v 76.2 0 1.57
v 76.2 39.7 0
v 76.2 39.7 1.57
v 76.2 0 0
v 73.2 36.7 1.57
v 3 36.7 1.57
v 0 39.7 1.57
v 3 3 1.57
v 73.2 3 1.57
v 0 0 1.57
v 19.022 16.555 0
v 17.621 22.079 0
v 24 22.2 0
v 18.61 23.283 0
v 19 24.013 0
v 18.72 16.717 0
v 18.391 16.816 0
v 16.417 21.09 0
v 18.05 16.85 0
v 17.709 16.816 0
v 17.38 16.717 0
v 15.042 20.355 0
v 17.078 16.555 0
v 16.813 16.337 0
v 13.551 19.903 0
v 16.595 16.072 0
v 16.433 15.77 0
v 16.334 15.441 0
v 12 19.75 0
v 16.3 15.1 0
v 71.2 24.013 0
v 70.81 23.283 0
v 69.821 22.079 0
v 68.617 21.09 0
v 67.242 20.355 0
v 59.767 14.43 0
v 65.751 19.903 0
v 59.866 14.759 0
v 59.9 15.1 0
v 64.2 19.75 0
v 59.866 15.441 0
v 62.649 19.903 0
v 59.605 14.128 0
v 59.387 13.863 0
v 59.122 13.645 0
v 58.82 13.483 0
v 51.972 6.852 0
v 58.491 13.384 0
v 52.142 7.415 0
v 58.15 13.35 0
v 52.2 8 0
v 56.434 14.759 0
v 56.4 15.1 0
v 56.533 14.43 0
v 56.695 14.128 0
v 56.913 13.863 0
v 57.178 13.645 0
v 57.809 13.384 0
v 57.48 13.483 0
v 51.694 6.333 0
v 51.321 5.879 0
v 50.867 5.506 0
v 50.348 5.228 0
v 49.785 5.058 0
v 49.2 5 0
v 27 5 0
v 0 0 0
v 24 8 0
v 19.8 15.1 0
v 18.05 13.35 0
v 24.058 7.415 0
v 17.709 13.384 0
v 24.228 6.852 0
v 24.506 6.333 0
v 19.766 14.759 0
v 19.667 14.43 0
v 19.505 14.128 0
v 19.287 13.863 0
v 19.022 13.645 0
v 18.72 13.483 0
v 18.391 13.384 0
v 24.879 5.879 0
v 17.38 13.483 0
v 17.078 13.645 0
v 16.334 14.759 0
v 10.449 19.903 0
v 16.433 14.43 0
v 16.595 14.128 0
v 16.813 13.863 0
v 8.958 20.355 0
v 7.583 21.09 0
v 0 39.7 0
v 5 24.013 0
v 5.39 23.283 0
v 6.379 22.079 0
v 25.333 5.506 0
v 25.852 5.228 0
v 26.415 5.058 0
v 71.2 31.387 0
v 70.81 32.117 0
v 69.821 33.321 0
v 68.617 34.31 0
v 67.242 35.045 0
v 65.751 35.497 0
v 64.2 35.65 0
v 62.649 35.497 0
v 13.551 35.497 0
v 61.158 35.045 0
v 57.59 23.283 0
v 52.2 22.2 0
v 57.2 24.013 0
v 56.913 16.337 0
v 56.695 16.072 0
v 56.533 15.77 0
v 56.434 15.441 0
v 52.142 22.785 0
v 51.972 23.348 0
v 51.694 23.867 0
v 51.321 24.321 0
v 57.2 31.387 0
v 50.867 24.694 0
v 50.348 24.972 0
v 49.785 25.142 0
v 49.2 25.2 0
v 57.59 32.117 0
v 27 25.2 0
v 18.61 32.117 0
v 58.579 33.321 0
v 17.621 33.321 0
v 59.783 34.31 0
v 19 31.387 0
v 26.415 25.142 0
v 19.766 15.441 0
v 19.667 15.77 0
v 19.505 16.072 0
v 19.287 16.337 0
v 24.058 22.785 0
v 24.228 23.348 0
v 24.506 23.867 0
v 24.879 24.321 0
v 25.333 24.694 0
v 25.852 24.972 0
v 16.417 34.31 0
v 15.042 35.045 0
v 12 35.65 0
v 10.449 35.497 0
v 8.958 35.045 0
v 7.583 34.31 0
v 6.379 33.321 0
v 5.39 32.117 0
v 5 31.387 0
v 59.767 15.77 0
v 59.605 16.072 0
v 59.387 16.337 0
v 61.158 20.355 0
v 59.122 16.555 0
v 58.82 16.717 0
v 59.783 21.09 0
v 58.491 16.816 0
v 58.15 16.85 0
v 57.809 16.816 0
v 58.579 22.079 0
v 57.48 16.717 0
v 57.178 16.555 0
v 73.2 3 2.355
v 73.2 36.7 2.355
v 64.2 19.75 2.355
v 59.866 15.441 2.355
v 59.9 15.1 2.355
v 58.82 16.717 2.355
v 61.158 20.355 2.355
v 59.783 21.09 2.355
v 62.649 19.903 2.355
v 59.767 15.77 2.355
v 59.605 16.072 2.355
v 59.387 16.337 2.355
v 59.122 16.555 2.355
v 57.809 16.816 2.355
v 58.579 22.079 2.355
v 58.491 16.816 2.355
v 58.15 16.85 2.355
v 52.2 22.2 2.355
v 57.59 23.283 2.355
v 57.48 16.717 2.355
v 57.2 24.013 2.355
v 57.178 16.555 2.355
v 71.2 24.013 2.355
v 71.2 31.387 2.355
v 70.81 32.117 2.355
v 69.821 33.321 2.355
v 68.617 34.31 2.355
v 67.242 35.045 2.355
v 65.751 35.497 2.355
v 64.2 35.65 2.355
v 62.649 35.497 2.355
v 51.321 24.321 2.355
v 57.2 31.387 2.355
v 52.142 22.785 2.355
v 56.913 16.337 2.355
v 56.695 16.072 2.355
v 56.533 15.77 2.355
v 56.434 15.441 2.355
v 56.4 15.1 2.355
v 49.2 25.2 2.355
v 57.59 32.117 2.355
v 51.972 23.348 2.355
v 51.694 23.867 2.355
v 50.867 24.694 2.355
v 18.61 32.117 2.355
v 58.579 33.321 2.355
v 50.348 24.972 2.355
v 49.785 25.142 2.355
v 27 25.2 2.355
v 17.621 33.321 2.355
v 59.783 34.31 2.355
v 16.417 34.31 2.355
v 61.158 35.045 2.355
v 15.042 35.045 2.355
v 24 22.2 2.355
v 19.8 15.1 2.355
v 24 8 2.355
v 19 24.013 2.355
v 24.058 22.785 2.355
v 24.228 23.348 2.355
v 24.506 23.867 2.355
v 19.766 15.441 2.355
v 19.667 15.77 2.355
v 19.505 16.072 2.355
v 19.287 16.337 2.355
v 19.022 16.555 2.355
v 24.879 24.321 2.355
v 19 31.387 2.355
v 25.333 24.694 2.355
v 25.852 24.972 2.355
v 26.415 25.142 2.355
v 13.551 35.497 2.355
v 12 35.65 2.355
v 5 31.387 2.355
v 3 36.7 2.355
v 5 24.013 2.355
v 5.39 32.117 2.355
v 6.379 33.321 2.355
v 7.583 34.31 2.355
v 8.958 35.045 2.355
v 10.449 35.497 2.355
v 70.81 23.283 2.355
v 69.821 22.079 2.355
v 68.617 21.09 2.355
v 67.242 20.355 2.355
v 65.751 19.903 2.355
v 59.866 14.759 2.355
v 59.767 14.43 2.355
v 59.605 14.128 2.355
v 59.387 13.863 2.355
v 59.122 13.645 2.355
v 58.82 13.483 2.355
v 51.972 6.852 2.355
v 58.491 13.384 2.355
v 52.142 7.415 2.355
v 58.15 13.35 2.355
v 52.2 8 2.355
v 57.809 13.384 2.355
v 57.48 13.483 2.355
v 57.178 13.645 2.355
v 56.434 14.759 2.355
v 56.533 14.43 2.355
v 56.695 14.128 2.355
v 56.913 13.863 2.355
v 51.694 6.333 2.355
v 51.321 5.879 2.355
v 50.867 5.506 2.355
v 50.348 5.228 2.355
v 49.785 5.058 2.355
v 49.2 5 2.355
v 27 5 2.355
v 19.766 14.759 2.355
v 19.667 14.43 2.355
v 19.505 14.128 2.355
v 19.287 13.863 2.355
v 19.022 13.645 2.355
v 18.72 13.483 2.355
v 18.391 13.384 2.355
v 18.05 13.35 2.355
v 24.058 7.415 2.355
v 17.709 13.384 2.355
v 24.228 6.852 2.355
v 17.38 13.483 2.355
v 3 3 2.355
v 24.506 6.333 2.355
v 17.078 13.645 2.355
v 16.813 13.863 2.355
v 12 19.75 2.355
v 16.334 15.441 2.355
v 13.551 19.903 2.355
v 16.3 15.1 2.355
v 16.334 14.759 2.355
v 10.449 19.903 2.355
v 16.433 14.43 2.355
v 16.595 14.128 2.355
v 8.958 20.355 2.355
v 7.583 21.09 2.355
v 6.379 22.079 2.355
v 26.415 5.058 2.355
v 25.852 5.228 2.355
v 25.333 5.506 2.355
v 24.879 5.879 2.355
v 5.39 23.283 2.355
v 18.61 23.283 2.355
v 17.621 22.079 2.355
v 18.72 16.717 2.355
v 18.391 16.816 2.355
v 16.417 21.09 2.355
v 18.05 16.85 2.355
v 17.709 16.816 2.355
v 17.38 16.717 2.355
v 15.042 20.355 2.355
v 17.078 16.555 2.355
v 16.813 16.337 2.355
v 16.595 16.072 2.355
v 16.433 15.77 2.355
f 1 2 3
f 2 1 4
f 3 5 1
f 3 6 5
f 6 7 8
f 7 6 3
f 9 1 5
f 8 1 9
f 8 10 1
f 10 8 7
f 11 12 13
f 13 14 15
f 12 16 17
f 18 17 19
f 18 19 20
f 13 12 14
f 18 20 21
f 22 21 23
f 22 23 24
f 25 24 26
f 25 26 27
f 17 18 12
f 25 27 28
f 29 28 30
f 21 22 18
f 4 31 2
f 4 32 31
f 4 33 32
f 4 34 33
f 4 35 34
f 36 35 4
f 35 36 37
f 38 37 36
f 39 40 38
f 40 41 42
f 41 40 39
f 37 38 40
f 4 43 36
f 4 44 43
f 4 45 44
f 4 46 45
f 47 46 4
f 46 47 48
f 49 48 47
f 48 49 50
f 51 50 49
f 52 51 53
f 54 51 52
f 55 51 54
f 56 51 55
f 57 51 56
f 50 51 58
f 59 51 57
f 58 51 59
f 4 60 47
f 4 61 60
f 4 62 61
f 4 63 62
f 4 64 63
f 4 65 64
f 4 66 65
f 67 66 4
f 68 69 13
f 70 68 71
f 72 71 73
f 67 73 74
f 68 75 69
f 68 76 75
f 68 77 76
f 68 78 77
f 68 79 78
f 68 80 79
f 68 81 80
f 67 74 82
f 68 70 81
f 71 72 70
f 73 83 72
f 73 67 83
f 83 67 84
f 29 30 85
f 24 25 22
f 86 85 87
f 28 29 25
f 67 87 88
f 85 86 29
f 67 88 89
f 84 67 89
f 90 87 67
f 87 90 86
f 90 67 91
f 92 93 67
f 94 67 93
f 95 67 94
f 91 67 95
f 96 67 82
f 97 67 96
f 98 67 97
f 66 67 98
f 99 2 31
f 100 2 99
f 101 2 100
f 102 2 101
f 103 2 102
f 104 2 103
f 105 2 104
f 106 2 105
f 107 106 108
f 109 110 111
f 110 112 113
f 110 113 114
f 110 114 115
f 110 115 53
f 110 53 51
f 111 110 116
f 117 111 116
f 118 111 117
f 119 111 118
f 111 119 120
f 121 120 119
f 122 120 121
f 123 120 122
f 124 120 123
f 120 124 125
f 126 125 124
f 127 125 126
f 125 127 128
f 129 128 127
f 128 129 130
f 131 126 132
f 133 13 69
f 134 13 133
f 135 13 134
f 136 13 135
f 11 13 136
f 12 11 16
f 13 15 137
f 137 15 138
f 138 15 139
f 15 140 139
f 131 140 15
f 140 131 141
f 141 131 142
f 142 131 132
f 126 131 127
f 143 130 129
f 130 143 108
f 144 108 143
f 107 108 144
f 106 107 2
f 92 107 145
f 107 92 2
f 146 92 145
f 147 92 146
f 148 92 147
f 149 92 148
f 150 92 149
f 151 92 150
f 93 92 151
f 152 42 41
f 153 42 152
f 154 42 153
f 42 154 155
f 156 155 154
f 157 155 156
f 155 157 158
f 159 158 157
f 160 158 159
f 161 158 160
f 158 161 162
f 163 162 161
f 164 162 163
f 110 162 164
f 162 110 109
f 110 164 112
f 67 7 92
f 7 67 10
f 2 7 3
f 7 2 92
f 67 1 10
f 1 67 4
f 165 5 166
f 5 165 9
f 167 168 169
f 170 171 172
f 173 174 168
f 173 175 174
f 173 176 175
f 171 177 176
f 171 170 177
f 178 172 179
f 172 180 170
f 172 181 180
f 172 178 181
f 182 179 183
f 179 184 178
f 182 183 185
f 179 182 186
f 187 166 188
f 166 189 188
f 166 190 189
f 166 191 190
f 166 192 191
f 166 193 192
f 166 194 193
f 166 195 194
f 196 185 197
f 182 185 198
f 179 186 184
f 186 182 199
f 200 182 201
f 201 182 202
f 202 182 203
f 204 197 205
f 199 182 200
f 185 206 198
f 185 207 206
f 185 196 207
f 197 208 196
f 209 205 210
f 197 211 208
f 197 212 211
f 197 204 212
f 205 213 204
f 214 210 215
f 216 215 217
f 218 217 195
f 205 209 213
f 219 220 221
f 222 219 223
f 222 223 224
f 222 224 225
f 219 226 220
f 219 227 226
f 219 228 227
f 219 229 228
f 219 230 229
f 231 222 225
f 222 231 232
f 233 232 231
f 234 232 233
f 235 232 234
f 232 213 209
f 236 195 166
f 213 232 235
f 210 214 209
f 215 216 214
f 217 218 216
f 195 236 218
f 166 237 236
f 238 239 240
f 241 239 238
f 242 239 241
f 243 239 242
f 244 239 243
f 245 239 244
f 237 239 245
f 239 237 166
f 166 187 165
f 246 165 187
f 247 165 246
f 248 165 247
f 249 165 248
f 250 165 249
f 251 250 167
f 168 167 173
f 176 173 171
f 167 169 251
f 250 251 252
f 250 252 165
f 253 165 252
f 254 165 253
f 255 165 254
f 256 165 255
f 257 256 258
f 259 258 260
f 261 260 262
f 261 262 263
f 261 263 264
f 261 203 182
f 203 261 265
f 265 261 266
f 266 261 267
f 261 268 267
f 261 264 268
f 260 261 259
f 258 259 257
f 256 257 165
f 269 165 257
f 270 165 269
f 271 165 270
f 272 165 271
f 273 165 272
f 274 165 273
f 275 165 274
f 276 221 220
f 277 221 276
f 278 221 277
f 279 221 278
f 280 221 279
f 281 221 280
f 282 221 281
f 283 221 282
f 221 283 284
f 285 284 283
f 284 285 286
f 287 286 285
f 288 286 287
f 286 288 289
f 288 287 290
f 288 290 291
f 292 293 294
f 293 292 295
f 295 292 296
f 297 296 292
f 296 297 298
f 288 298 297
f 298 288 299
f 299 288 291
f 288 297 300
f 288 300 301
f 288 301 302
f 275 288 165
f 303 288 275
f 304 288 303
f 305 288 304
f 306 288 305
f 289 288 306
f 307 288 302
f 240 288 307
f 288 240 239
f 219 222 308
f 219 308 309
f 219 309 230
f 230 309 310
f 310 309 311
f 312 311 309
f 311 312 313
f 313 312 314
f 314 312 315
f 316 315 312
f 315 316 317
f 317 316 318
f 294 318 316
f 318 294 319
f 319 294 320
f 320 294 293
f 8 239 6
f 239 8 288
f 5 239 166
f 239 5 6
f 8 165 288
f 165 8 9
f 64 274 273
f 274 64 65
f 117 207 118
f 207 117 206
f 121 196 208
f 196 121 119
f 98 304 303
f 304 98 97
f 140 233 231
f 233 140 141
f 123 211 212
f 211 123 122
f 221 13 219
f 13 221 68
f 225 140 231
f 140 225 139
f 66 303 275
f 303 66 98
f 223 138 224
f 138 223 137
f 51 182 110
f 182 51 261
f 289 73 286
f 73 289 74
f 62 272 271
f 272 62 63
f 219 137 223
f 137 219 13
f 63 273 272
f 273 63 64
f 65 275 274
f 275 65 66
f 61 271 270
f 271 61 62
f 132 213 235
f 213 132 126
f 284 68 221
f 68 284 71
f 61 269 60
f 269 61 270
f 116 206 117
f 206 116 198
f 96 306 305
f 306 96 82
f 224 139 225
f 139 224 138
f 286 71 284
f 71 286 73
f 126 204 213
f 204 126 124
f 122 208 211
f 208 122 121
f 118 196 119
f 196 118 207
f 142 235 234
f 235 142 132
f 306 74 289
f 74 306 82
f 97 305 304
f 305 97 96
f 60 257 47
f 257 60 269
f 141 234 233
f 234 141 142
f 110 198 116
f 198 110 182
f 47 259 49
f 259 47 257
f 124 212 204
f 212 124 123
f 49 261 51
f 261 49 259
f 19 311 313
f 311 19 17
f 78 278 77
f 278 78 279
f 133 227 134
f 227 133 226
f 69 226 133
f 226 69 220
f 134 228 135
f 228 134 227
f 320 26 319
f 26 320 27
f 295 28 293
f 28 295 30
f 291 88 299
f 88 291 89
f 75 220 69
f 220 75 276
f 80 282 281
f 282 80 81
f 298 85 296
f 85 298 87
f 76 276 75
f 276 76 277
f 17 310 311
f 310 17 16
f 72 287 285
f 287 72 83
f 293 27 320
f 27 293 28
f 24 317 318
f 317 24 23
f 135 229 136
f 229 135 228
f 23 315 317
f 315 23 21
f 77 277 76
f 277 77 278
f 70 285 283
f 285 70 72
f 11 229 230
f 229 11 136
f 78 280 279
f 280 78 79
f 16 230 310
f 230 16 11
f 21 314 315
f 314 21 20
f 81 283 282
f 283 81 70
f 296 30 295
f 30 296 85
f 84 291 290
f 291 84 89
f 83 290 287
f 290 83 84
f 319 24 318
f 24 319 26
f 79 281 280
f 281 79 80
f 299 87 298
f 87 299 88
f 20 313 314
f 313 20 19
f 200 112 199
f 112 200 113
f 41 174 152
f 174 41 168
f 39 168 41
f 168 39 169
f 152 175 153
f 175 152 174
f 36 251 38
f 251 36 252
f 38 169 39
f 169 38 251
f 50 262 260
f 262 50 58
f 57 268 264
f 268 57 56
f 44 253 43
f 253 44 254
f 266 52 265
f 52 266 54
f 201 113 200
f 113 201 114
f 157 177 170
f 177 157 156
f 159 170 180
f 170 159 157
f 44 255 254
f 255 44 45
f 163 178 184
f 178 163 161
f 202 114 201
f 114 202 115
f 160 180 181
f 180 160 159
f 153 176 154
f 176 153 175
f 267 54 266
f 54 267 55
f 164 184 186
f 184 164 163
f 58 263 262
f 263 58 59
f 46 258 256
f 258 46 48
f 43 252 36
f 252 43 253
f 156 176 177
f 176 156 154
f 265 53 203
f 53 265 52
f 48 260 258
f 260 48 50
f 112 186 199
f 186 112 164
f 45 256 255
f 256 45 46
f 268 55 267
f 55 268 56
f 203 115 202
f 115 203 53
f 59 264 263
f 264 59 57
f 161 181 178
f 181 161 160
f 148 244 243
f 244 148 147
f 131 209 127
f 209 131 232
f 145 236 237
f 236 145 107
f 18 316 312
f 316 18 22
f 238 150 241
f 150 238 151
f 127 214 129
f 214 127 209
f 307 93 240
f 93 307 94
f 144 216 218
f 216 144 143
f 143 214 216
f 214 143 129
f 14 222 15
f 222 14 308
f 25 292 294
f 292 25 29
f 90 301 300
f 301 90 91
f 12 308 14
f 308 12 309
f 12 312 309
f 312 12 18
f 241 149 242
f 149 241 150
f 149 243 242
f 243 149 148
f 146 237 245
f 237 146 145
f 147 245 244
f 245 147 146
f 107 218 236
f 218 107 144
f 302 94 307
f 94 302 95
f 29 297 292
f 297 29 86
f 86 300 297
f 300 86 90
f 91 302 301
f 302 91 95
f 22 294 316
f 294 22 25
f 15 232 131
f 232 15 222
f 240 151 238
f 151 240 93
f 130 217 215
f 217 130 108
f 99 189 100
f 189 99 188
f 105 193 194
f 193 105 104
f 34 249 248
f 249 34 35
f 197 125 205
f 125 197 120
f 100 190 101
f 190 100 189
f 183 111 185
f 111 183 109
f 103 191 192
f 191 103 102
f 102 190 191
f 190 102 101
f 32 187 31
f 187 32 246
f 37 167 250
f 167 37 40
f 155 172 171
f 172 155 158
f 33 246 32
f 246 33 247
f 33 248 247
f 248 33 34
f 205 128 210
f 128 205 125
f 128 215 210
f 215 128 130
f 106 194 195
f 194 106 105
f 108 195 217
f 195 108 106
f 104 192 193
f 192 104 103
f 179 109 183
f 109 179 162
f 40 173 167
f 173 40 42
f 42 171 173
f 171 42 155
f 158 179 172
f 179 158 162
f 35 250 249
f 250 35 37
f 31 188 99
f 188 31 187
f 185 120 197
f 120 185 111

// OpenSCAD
// file: panel.scad
// entire panel
panel_ht =  39.7;
panel_wd =  76.2;
panel_th = 1.57;
panel_clearance = 2;    // around edges

// edge offset of extra thickness
edge_offset = 3;

module plate() {
    cube([panel_wd, panel_ht, panel_th]);
}
    
module inner_plate() {
	translate([edge_offset, edge_offset, panel_th])
		cube([panel_wd-edge_offset*2, panel_ht-edge_offset*2, panel_th/2]);
}
// main file
include <panel.scad>

// power connector
R = 3;          // corner radius
H = 20.2;		// actual height	
W = 28.2;		// actual width

pwr_screw_centers = 40.1;		// mounting screw holes

// connector plug body relative to mounting screw hole
pwr_offset_h = (pwr_screw_centers - W)/2;

// centers of radius columns
pwr_inner_ht = H - 2*R;
pwr_inner_wd = W - 2*R;

screw = 3.5;

// bushing
bushing_ht = 15.9;          // rectangle height
bushing_wd = 14;          // circle

// power placement relatitve to bottom edge
pwr_offset_y = 5;

// bushing placement relative to top and side edges
bushing_offset_x = 12;
bushing_offset_y = 12;


module plug() {

	translate([screw/2, 0, 0]) 
    {
		union() 
		{
			hull() {
				translate([pwr_offset_h, 0, 0]) 
				{
					translate([R, R, 0])
						cylinder(r=R, h=10, $fn=32); 
						
					translate([R, H-R, 0])
						cylinder(r=R, h=10, $fn=32);
						
					translate([W-R, R, 0])
						cylinder(r=R, h=10, $fn=32);
						
					translate([W-R, H-R, 0])
						cylinder(r=R, h=10, $fn=32);
				}
			}
        
			translate([0, H/2, 0])
				cylinder(d=screw, h=10, $fn=32);
         
			translate([2*pwr_offset_h + W , H/2, 0])
				cylinder(d=screw, h=10, $fn=32);
		}
        
    }
	
}
	
	
 


module bushing() {
    intersection() {
		cylinder(d=bushing_ht, h=15, $fn=32, center=true);
		cube([bushing_wd, 100, 100], center=true);
    }
}
/*
bushing();
color("black")
translate([0, bushing_wd/2,0])
cube([10, .5, 10], center=true);
*/
module _bushing() {
    intersection() 
    {
		cylinder(d=17, h=15, $fn=32, center=true);
		cube([12, 17, 10], center=true);
    }
}



// main begins

debugging = false;

if (debugging) {
	*translate([(panel_wd - pwr_screw_centers - screw)/2, 0, 0]) 
	{
		plug();

		translate([screw/2, -10, 0])
			color("black") cube([.5,50,10]);
		translate([screw/2, -5, 0])
			color("black") cube([40, .5, 10]);
		translate([screw/2 + 40, -10, 0])
			color("black") cube([.5,50,10]);
	}
	
	// crosshairs
	translate([panel_wd/2-.25, 0, 0])
		   color("black") cube([.5,50,10]);
	translate([-.25, panel_ht-H, 0])
		   color("black") cube([panel_wd, .5,10]);

	translate([bushing_offset_x-.25, 0, 0])
		   color("violet") cube([0.5, 100, 10]);
	translate([panel_wd-bushing_offset_x-.25, 0, 0])
		   color("violet") cube([0.5, 100, 10]);
	translate([0, panel_ht - bushing_offset_y -.25, 0])
		   color("violet") cube([100, 0.5, 10]);


	translate([ (panel_wd - pwr_screw_centers )/2-.25, (panel_ht-H)/4, -1]) 
	// translate([screw/2 + (panel_wd - W)/2 - pwr_offset_h, 0, 0])
	{
		{
			color("red") cube([pwr_screw_centers, .5, 5]);
			color("blue") cube([.5, pwr_screw_centers, 5]);
			translate([pwr_screw_centers, 0, 0])
				color("green") cube([.5, 40, 5]);
			
		}
	}
}    

// the actual one
module rear_panel() {
difference() {
    union() {
		plate();
		inner_plate();
	}
    translate([(panel_wd  - pwr_screw_centers - screw)/2 , pwr_offset_y /*((panel_ht-H)/2)*/, -1])
        plug();
    
	translate([bushing_offset_x, panel_ht-bushing_offset_y, 0])
		bushing();
    translate([panel_wd-bushing_offset_x, panel_ht-bushing_offset_y, -1])
		bushing();

}

*translate([(panel_wd-W -2*pwr_offset_h)/2, ((panel_ht-H)/2)*.5, -1])
    %cube([W+2*pwr_offset_h, H, 5]);
    
}



rear_panel();
